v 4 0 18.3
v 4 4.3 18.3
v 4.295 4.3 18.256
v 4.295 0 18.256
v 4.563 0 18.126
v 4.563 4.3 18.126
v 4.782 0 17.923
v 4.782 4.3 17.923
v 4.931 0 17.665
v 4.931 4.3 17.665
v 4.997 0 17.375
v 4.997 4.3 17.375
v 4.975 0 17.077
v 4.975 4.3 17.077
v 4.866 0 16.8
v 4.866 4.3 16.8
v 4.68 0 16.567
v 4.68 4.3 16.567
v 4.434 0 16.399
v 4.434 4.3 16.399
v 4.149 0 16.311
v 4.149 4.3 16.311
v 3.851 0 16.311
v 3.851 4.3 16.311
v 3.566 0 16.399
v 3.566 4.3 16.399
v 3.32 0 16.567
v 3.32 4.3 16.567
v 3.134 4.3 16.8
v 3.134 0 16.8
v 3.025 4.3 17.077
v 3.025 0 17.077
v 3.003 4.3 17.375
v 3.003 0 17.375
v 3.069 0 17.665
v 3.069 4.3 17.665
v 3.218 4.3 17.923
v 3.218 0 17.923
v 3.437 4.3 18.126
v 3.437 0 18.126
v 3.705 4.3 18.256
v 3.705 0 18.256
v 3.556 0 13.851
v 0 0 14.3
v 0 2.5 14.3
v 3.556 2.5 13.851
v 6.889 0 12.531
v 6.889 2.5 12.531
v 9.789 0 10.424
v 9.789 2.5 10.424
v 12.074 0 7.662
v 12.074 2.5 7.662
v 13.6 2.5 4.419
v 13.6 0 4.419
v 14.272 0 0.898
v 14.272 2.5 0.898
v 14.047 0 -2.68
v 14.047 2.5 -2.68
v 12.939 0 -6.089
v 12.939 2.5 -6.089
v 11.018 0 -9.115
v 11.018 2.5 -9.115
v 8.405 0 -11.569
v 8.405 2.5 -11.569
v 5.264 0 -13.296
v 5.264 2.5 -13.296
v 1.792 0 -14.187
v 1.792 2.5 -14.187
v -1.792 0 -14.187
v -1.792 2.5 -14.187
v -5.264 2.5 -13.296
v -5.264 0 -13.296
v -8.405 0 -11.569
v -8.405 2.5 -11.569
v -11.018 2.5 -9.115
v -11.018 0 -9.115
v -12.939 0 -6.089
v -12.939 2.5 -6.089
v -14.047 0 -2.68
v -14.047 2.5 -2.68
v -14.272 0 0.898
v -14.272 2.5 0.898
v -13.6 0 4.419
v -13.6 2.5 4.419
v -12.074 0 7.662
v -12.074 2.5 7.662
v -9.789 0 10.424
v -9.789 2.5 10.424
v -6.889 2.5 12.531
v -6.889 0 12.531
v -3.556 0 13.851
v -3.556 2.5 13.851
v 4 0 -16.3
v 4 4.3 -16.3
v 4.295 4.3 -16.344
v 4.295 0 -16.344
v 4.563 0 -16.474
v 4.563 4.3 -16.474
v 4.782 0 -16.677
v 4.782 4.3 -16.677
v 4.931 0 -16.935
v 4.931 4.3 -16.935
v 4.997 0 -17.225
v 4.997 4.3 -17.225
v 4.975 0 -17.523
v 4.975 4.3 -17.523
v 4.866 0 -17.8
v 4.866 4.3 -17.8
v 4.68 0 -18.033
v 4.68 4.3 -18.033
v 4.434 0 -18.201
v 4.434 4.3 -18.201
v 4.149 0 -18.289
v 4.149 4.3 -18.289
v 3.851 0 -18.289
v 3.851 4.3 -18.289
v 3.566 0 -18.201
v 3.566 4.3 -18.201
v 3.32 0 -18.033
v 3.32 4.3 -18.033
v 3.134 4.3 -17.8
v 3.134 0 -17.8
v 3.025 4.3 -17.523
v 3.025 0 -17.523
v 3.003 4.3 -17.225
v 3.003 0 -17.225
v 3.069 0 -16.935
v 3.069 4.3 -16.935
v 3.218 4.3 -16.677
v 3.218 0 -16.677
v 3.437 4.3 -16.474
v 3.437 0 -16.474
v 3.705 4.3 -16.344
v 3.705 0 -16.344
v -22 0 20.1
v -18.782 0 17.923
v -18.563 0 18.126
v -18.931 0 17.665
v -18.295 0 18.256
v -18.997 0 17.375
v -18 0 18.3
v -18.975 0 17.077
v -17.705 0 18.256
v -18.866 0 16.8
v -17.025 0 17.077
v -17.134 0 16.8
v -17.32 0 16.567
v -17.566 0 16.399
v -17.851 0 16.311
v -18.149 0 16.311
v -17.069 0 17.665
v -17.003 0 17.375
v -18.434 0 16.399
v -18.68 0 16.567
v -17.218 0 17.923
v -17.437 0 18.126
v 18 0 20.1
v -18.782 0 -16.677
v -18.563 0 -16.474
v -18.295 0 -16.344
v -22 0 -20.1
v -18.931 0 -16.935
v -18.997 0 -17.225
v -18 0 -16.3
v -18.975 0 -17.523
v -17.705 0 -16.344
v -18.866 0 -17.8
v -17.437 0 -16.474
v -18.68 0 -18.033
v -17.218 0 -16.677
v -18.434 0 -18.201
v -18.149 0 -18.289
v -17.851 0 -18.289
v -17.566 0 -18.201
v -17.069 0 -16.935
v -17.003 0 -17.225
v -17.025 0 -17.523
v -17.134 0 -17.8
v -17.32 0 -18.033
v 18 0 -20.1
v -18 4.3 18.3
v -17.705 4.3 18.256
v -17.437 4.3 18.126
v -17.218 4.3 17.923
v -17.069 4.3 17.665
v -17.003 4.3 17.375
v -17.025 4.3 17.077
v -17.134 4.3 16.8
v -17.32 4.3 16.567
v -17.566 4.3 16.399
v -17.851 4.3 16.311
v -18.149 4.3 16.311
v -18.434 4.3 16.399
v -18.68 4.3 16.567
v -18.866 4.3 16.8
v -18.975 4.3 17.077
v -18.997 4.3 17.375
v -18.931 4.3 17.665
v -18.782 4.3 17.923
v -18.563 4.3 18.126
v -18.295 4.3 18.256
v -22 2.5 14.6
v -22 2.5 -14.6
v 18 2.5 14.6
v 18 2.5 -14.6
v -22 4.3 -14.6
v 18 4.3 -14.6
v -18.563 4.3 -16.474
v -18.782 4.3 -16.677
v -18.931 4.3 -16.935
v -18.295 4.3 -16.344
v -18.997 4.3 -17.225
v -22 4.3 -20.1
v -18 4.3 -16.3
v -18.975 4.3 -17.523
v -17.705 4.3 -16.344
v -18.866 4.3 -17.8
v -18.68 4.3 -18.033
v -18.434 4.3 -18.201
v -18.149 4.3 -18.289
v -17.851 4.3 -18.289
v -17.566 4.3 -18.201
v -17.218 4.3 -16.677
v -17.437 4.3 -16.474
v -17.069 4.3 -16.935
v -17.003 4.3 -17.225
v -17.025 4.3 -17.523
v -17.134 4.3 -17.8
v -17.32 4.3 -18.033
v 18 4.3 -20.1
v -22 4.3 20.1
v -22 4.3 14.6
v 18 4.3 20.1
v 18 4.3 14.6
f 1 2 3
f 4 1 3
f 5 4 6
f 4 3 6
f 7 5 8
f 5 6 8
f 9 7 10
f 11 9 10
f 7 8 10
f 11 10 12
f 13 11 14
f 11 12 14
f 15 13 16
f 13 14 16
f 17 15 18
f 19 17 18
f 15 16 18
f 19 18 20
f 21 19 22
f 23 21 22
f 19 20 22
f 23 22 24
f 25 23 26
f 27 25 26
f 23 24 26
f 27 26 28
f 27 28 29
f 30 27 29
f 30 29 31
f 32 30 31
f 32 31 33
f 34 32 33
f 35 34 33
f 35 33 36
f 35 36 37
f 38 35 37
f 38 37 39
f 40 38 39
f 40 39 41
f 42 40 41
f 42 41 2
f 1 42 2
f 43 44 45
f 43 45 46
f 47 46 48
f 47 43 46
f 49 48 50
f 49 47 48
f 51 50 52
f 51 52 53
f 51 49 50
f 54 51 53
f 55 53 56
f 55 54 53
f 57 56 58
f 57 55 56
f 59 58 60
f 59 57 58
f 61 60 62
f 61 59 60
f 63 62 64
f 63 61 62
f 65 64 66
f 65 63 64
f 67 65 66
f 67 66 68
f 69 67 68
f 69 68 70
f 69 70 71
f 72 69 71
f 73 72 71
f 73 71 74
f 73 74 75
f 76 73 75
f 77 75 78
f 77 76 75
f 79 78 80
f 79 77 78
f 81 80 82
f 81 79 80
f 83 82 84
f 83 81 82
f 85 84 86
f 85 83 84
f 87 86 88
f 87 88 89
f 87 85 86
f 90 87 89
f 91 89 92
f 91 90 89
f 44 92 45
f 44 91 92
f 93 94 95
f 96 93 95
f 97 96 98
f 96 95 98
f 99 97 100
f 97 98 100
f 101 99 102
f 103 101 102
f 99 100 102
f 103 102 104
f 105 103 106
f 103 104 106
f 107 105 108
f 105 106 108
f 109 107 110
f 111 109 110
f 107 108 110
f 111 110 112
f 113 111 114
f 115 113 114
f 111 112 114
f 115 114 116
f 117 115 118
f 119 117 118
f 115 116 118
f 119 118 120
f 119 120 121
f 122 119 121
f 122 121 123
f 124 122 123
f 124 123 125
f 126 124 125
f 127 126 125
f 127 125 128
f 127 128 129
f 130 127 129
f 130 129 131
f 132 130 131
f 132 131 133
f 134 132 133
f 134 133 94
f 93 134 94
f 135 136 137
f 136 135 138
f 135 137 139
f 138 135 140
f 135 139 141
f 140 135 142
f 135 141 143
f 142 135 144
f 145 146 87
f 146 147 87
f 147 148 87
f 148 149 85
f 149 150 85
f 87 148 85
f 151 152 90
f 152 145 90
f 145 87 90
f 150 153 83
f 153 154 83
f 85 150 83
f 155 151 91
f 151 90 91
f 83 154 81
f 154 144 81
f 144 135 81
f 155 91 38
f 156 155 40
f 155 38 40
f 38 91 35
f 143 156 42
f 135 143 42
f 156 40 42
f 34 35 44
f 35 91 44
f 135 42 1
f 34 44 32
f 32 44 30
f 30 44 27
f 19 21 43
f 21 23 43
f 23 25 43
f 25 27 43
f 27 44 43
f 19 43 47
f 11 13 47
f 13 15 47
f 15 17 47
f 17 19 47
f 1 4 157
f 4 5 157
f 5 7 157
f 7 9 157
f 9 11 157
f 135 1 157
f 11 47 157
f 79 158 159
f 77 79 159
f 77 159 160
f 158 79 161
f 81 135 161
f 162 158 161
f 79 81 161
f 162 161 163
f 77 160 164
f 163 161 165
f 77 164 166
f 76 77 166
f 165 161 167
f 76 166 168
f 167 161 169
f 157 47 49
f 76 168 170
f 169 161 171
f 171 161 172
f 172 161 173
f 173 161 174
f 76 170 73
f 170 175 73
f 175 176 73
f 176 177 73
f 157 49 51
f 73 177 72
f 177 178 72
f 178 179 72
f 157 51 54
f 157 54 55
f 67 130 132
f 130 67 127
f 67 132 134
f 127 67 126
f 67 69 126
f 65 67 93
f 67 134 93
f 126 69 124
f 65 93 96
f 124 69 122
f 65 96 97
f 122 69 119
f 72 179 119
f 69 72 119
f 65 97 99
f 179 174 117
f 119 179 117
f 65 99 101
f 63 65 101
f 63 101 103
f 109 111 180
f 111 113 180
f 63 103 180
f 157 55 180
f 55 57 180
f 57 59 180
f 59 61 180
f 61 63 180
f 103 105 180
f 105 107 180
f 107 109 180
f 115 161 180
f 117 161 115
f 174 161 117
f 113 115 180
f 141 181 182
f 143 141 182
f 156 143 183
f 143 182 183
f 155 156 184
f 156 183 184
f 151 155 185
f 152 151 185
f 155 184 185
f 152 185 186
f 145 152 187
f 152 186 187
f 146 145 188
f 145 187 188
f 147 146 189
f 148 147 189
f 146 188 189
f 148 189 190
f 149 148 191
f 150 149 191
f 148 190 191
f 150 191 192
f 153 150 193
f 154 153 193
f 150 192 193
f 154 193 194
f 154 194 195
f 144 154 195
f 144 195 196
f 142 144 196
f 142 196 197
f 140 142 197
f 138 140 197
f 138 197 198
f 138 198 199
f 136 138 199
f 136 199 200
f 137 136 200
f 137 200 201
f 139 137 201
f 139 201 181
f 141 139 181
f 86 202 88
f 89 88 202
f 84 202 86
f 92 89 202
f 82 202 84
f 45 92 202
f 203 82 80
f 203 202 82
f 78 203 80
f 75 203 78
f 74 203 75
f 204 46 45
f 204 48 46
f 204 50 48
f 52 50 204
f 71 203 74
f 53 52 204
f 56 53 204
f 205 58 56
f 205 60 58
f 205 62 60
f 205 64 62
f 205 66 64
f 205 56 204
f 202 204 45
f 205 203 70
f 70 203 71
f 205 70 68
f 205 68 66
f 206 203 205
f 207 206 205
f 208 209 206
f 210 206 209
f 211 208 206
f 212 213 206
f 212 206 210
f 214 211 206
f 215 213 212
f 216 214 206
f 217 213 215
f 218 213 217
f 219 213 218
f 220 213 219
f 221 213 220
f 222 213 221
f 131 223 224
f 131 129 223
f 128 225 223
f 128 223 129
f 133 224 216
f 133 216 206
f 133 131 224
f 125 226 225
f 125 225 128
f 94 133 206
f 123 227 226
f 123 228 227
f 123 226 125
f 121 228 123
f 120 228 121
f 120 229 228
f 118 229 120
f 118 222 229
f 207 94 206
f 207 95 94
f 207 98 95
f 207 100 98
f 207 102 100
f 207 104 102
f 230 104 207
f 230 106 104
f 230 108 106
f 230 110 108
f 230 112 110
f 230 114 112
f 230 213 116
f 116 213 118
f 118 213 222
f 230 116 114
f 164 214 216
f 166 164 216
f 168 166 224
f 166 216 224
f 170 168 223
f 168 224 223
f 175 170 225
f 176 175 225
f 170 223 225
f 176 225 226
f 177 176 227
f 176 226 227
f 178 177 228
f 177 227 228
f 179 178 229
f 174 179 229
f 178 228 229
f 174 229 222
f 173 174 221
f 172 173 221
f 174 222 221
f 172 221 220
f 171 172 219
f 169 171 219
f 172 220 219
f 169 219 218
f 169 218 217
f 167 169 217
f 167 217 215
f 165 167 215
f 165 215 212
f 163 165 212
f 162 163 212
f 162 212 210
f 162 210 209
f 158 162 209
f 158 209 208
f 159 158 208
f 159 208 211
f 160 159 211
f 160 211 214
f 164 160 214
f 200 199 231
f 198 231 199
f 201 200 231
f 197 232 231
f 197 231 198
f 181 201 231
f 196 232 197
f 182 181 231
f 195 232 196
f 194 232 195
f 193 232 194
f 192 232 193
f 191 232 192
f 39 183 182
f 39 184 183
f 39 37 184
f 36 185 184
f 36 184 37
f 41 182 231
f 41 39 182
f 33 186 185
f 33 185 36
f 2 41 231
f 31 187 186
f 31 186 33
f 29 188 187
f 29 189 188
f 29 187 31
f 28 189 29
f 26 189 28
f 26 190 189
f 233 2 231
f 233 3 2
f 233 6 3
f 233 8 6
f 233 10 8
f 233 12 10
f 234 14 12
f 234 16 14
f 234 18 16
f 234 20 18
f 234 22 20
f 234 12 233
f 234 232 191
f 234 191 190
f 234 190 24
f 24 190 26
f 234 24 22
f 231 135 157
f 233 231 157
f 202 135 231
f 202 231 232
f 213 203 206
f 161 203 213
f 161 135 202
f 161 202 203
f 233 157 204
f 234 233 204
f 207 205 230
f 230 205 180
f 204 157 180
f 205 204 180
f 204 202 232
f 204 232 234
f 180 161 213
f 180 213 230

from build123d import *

# Parameters (mm, degrees)
SKETCH_1_W          = 40
SKETCH_1_H          = 40.2
SKETCH_1_R          = 14.3
EXTRUDE_1_DEPTH     = 2.5
SKETCH_2_W          = 40
SKETCH_2_H          = 5.5
EXTRUDE_2_DEPTH     = 1.8
CUT_EXTRUDE_1_REACH = 32.108
SKETCH_3_R          = 1


with BuildPart() as part:
    # 草图1 → 凸台-拉伸1 (new body)
    with BuildSketch(Plane(origin=(0, 0, 0), x_dir=(1, 0, 0), z_dir=(0, 1, 0))):
        with Locations((-2, 0)):
            Rectangle(SKETCH_1_W, SKETCH_1_H)
        with Locations(Location((0, 0, 0), (0, 0, 270))):
            Circle(SKETCH_1_R, mode=Mode.SUBTRACT)
    extrude(amount=EXTRUDE_1_DEPTH)

    # 草图2 → 凸台-拉伸2 (add)
    with BuildSketch(Plane(origin=(0, 2.5, 0), x_dir=(1, 0, 0), z_dir=(0, 1, 0))):
        with Locations((-2, 17.35)):
            Rectangle(SKETCH_2_W, SKETCH_2_H)
        with Locations((-2, -17.35)):
            Rectangle(SKETCH_2_W, SKETCH_2_H)
    extrude(amount=EXTRUDE_2_DEPTH)

    # 草图3 → 切除-拉伸1 (cut, up to next)
    with BuildSketch(Plane(origin=(0, 4.3, 0), x_dir=(1, 0, 0), z_dir=(0, 1, 0)), mode=Mode.PRIVATE) as cut_extrude_1_sk1:
        with Locations(Location((4, 17.3, 0), (0, 0, 270))):
            Circle(SKETCH_3_R)
    cut_extrude_1_tool1 = extrude(cut_extrude_1_sk1.sketch, amount=-CUT_EXTRUDE_1_REACH, mode=Mode.PRIVATE) & part.part
    # 草图3 → 切除-拉伸1 (cut, up to next)
    with BuildSketch(Plane(origin=(0, 4.3, 0), x_dir=(1, 0, 0), z_dir=(0, 1, 0)), mode=Mode.PRIVATE) as cut_extrude_1_sk2:
        with Locations(Location((-18, 17.3, 0), (0, 0, 270))):
            Circle(SKETCH_3_R)
    cut_extrude_1_tool2 = extrude(cut_extrude_1_sk2.sketch, amount=-CUT_EXTRUDE_1_REACH, mode=Mode.PRIVATE) & part.part
    # 草图3 → 切除-拉伸1 (cut, up to next)
    with BuildSketch(Plane(origin=(0, 4.3, 0), x_dir=(1, 0, 0), z_dir=(0, 1, 0)), mode=Mode.PRIVATE) as cut_extrude_1_sk3:
        with Locations(Location((-18, -17.3, 0), (0, 0, 270))):
            Circle(SKETCH_3_R)
    cut_extrude_1_tool3 = extrude(cut_extrude_1_sk3.sketch, amount=-CUT_EXTRUDE_1_REACH, mode=Mode.PRIVATE) & part.part
    # 草图3 → 切除-拉伸1 (cut, up to next)
    with BuildSketch(Plane(origin=(0, 4.3, 0), x_dir=(1, 0, 0), z_dir=(0, 1, 0)), mode=Mode.PRIVATE) as cut_extrude_1_sk4:
        with Locations(Location((4, -17.3, 0), (0, 0, 270))):
            Circle(SKETCH_3_R)
    cut_extrude_1_tool4 = extrude(cut_extrude_1_sk4.sketch, amount=-CUT_EXTRUDE_1_REACH, mode=Mode.PRIVATE) & part.part
    add(cut_extrude_1_tool1.solids().sort_by_distance((4, 4.3, -17.3))[0], mode=Mode.SUBTRACT)
    add(cut_extrude_1_tool2.solids().sort_by_distance((-18, 4.3, -17.3))[0], mode=Mode.SUBTRACT)
    add(cut_extrude_1_tool3.solids().sort_by_distance((-18, 4.3, 17.3))[0], mode=Mode.SUBTRACT)
    add(cut_extrude_1_tool4.solids().sort_by_distance((4, 4.3, 17.3))[0], mode=Mode.SUBTRACT)


solid = part.part
